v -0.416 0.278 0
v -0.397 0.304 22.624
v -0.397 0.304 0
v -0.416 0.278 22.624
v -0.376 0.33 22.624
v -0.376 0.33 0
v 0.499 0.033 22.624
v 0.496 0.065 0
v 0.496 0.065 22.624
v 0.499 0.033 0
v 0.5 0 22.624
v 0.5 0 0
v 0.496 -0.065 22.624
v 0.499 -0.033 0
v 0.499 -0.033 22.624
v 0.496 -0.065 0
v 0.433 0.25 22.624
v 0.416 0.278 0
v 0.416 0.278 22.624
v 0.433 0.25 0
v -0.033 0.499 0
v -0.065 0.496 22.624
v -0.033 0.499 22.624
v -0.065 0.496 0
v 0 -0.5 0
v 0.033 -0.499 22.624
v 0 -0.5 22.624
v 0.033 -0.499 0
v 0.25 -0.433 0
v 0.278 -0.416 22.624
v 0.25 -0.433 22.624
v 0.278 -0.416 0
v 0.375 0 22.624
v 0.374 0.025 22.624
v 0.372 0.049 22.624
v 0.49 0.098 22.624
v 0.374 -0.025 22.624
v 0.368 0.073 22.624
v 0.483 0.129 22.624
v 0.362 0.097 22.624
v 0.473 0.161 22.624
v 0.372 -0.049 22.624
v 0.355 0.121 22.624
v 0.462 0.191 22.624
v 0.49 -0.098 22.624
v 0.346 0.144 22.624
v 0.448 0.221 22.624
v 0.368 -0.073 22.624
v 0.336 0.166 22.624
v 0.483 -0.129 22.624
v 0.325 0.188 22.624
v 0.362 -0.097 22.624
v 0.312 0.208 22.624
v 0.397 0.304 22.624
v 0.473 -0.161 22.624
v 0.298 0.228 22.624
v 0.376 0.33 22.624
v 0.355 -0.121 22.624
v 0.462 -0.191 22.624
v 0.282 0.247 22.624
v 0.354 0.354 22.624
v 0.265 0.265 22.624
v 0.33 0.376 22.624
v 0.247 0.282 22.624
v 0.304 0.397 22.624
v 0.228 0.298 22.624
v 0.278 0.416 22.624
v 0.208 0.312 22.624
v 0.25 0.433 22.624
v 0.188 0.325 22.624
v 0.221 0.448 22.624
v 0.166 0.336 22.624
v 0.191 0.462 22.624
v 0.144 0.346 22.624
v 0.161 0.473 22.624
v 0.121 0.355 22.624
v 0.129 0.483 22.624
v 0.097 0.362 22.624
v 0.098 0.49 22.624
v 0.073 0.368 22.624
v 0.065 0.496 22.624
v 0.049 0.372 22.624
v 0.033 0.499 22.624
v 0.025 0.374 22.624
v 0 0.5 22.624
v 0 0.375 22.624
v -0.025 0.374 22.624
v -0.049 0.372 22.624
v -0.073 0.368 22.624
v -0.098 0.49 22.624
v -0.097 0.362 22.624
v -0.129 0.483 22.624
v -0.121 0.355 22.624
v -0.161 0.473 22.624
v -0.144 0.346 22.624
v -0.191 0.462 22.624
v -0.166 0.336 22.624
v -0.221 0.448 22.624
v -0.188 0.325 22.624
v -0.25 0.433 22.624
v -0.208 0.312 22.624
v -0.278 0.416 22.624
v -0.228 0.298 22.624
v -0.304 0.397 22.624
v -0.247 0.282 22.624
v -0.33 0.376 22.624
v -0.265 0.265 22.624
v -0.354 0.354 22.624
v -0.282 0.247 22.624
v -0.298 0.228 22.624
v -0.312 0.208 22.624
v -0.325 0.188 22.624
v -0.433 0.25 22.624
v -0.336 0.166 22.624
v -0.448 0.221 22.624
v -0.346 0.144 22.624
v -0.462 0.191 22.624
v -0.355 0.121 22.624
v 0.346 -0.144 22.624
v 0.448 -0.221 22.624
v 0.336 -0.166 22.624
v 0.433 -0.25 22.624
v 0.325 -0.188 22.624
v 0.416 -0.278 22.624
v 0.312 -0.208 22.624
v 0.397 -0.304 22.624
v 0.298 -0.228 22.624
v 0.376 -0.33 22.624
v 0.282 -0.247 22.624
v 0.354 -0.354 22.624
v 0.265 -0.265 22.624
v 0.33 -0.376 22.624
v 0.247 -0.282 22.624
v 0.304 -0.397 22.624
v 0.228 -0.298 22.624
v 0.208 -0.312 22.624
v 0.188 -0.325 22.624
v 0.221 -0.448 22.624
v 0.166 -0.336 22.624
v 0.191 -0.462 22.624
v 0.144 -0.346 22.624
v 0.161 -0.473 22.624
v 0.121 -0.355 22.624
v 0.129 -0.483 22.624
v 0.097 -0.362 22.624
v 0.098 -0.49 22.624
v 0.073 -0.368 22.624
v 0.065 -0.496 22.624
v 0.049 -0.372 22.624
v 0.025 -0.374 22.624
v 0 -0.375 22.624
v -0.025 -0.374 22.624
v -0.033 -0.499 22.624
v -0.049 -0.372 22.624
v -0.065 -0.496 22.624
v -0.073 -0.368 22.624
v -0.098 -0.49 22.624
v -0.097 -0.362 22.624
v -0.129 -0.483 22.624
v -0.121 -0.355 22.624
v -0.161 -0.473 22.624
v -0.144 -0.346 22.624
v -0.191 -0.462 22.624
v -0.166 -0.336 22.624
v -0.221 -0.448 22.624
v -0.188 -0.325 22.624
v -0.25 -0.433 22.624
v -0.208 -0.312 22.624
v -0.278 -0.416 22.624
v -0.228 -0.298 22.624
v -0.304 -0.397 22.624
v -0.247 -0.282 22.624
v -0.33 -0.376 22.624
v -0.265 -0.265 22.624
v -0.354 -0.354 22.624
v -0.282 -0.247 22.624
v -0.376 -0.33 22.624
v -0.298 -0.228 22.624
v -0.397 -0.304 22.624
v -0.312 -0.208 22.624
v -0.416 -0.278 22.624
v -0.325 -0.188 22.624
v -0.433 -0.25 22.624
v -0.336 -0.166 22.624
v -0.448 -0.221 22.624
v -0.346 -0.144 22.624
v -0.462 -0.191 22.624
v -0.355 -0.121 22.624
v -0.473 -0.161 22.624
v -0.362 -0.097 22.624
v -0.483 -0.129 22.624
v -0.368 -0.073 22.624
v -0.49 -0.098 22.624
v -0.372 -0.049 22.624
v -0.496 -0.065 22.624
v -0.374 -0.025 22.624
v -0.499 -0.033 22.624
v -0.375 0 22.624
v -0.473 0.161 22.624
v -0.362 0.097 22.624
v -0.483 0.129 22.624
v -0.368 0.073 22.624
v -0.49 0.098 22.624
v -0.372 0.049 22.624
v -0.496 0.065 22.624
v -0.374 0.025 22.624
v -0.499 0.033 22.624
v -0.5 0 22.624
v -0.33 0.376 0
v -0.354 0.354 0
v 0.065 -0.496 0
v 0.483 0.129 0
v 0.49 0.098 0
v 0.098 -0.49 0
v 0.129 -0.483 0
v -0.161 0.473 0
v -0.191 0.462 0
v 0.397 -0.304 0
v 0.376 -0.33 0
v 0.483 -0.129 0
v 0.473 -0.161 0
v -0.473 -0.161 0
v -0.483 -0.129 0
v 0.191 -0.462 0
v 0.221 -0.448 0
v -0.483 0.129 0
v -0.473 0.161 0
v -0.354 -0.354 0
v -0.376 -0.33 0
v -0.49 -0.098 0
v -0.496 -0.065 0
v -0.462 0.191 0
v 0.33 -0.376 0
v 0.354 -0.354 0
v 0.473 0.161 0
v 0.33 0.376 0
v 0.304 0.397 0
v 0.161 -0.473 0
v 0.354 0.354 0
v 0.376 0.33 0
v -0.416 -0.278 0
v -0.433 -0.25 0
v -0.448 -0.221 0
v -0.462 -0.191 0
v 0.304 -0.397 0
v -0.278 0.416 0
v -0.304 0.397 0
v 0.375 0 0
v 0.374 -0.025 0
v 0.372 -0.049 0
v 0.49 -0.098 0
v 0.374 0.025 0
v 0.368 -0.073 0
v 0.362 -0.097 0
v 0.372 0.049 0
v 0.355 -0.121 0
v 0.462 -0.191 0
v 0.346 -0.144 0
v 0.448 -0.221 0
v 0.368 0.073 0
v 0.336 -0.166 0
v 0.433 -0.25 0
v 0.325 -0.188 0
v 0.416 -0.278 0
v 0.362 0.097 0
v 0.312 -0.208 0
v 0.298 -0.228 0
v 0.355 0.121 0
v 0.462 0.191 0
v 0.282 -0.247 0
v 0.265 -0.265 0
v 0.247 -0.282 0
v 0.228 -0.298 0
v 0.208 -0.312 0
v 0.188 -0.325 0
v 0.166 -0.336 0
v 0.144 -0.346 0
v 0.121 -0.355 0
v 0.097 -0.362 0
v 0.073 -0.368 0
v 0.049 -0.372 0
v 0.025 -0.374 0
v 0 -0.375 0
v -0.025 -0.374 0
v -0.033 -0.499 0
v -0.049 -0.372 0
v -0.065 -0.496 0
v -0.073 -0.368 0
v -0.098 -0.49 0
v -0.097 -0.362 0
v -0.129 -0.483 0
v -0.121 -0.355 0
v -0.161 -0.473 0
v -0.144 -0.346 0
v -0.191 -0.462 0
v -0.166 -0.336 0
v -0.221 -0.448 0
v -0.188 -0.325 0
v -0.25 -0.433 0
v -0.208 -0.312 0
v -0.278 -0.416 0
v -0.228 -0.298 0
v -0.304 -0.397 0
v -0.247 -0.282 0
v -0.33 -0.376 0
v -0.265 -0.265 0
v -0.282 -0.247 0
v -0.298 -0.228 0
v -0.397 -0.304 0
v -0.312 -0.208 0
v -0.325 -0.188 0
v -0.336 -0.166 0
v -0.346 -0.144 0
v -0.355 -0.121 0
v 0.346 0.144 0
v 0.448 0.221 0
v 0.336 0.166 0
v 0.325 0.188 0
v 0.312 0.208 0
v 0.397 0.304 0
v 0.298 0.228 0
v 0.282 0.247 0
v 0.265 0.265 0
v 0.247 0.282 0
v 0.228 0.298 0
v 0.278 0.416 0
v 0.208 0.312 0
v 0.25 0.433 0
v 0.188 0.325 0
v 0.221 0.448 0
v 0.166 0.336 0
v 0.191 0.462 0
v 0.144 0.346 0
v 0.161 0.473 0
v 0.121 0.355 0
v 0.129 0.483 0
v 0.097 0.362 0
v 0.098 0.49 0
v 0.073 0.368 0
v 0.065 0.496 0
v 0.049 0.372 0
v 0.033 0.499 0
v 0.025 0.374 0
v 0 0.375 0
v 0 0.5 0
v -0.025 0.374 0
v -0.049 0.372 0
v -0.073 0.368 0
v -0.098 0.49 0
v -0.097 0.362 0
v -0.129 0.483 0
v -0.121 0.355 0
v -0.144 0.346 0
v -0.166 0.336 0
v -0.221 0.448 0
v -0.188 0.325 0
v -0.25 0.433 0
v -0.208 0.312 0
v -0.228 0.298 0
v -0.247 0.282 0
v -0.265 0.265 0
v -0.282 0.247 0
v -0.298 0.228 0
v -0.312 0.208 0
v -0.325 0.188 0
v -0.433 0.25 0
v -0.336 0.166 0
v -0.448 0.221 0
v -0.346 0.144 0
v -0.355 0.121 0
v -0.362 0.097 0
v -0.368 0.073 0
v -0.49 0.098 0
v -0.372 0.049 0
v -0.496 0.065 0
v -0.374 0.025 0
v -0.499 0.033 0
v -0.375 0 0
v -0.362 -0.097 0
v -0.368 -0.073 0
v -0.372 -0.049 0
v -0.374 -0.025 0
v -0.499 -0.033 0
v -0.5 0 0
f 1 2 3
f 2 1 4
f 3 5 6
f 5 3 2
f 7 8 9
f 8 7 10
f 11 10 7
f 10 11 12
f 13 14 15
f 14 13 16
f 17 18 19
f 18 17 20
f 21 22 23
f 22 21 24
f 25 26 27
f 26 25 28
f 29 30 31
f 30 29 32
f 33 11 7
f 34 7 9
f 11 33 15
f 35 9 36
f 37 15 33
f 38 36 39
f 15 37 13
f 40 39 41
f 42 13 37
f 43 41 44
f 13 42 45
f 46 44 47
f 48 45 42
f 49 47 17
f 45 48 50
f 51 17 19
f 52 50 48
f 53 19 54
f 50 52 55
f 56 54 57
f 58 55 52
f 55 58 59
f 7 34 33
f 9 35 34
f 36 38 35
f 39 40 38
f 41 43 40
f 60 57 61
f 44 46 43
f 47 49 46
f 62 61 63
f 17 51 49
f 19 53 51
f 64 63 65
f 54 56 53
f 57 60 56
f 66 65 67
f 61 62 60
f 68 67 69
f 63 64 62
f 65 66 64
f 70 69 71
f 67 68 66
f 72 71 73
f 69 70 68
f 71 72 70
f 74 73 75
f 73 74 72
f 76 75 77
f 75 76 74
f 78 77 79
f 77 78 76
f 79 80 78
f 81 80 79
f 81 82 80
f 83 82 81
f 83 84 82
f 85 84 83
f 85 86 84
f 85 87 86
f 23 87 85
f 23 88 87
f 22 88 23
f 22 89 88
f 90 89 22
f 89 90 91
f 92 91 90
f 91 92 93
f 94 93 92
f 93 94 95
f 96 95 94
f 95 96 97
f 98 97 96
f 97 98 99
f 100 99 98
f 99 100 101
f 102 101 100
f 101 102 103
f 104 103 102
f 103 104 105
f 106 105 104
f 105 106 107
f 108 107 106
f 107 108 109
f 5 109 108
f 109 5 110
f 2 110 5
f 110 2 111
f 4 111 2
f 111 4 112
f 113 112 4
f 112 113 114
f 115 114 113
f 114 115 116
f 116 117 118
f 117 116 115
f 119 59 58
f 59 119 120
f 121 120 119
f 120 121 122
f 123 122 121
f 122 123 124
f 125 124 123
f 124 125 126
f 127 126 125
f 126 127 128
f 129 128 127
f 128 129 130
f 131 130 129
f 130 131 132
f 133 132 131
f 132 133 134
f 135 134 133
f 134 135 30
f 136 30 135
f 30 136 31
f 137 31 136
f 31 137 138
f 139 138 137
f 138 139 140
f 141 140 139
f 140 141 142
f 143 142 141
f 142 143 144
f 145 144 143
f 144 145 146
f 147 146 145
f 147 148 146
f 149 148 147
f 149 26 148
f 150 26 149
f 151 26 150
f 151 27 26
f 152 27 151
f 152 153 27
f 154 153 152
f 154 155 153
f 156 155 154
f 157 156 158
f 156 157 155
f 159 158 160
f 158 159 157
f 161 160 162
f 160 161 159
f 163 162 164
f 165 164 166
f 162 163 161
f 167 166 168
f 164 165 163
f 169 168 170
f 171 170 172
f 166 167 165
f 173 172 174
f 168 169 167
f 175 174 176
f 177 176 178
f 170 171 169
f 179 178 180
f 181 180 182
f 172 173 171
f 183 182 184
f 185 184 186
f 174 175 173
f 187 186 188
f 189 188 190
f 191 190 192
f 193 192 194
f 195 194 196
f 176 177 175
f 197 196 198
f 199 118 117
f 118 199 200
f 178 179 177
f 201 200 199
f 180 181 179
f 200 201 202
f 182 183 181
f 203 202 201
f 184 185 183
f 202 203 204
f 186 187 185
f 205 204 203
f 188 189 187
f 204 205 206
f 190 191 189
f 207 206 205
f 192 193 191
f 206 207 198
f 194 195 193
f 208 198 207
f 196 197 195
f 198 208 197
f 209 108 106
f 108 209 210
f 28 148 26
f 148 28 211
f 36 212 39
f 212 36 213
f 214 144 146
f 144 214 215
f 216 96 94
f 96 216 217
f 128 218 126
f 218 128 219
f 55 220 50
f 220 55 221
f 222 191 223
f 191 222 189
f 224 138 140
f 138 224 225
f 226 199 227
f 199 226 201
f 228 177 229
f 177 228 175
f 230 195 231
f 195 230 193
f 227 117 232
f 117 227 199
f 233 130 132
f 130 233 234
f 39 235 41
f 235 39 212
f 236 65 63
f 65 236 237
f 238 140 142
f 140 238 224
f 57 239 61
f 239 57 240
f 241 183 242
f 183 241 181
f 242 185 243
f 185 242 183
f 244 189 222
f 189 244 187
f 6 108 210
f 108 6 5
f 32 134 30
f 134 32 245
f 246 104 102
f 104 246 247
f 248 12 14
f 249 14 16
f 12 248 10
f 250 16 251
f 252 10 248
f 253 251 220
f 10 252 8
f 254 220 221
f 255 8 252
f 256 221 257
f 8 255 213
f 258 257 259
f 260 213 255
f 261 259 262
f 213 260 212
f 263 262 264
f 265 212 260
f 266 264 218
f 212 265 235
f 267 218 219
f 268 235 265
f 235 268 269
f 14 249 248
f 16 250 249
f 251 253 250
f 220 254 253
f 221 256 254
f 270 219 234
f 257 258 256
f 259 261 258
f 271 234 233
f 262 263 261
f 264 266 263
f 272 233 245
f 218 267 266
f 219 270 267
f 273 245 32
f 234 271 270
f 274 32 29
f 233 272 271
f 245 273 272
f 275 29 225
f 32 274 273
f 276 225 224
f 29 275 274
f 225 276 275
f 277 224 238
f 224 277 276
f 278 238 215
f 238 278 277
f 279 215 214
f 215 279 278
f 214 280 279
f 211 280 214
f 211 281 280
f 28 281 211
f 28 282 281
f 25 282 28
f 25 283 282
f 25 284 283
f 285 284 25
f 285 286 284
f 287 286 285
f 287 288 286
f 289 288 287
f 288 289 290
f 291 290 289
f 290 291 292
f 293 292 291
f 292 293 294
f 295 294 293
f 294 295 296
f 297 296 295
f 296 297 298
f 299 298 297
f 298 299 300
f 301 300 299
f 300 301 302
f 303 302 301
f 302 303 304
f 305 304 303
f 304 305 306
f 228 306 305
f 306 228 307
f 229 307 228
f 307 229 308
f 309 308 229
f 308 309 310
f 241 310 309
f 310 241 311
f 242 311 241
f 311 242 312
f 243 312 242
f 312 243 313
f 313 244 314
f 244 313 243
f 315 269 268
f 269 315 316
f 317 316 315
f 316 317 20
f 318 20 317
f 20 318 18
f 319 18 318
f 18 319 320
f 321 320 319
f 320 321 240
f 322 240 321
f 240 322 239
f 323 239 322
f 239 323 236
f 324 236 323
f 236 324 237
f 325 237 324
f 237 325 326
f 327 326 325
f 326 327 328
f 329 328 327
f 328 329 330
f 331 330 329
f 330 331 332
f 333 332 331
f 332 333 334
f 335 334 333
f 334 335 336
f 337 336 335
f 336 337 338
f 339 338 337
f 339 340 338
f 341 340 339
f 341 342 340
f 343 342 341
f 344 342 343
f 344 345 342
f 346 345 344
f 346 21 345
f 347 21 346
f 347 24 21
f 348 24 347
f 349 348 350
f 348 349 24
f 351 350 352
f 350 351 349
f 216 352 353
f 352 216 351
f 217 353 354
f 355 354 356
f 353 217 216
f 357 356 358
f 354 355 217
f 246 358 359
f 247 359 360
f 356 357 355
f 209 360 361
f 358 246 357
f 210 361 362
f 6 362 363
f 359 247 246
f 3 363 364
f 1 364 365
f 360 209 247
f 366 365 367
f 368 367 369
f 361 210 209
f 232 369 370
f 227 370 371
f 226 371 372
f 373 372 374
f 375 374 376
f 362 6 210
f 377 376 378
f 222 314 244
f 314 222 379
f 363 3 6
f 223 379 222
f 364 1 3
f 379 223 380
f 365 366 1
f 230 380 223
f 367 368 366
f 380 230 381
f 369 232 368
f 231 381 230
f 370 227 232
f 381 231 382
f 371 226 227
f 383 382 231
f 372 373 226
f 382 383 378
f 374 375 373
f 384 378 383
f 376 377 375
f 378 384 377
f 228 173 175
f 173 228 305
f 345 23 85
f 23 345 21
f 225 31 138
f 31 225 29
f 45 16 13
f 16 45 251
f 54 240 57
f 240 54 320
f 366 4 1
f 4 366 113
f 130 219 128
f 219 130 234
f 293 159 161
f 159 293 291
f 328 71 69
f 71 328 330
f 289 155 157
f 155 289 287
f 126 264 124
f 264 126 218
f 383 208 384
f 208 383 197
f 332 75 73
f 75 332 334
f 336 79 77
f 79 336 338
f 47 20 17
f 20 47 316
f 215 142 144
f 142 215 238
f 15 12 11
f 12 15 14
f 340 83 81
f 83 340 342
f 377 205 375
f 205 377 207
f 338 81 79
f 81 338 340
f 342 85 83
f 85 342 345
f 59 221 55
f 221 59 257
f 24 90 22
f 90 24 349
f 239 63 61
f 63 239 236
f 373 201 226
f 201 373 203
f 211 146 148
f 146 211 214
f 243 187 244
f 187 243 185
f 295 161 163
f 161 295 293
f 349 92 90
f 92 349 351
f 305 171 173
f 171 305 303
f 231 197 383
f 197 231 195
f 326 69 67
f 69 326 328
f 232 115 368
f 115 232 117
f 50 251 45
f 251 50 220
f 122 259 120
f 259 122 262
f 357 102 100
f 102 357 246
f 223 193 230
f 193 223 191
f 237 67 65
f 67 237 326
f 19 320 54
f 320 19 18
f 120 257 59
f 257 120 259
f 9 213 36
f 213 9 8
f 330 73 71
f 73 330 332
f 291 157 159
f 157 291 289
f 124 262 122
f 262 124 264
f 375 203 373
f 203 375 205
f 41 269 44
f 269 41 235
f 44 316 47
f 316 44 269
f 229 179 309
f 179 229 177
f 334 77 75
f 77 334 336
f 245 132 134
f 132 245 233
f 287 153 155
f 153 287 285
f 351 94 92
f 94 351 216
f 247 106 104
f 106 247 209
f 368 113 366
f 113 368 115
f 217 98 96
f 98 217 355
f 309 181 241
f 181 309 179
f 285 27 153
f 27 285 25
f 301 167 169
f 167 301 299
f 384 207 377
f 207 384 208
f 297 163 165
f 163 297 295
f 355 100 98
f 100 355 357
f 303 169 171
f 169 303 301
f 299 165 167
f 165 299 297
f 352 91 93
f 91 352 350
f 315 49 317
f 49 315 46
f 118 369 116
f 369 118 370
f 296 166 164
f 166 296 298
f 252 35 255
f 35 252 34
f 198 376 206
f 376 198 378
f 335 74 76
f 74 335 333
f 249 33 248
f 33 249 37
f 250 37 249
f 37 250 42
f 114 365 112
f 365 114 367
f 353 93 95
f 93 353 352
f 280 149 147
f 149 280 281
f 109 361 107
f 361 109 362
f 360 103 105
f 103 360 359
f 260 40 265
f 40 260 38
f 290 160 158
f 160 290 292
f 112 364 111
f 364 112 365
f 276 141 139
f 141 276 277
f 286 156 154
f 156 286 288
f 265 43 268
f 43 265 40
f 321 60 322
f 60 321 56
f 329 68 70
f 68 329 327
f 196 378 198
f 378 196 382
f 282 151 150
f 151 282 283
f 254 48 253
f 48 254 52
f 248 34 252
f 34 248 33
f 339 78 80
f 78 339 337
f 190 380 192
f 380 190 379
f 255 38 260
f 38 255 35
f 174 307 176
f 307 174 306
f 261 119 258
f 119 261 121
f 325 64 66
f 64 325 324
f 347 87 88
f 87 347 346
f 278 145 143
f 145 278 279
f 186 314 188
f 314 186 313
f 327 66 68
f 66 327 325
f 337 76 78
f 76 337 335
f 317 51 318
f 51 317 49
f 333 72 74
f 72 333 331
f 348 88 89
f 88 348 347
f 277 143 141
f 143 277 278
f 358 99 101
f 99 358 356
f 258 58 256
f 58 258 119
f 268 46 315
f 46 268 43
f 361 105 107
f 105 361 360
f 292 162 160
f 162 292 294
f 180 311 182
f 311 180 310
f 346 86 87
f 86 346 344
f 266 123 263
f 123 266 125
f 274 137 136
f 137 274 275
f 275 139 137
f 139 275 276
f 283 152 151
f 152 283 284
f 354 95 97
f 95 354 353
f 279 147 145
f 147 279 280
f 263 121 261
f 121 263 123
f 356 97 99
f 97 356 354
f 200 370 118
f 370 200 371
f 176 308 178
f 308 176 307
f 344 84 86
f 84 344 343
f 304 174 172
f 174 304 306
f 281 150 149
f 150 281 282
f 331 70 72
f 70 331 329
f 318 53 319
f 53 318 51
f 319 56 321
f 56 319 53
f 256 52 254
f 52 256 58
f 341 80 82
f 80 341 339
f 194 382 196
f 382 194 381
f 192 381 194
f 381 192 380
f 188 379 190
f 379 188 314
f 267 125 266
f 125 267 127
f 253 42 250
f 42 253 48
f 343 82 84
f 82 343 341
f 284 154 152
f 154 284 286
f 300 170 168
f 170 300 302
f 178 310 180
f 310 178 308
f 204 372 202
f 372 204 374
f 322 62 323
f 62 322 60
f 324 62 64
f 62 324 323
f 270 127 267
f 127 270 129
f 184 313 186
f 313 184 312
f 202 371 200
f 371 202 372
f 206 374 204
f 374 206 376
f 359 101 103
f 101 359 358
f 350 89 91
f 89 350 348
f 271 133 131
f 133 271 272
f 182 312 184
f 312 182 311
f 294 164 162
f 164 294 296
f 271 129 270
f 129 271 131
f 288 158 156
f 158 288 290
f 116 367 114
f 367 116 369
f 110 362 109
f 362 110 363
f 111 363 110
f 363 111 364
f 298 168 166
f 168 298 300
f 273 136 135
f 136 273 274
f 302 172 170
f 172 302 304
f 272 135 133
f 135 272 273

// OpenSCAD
// =============================================================
// Irish Flute — Parametric OpenSCAD Master
// =============================================================
// Source of truth: design.md (Governing Model + Tone-Hole First Pass table),
// family-spec.csv (IFL-D4 row), cut-list.csv (stock/OD).
//
// Authority status: pending_measurement — NOT fabrication authority until
// reviewed against a measured D4 prototype (validation.csv V-FUND and
// per-hole cents-error rows). See cad/mcp-session-log.md for provenance.
//
// SCOPE BOUNDARY (tuning-sensitive geometry intentionally out of scope):
//   - Embouchure window/bevel geometry is NOT modeled here. design.md A2
//     notes the embouchure correction is only an ordinary open-end
//     approximation; real embouchure cutting must be hand-refined and
//     play-tested (cad/README.md "Model Order" step 2).
//   - Tone-hole undercutting/voicing is NOT modeled; holes are drawn at
//     the design.md starter diameters only, "drill undersize and tune
//     up incrementally" (design.md A3).
//   - This is an open-open cylindrical-bore envelope + tone-hole position
//     schedule only, per the instrument-maker starter-generator boundary.
// =============================================================

$fn = 96;

// --------- INPUT PARAMETERS (edit only against design.md / family-spec.csv) ---

// Governing acoustic model (design.md "Governing Model"): open-open
// cylindrical pipe.  f = c / (2*L_eff);  L_eff = c / (2*f);
// L_bore = L_eff - 2*(0.6*r)   [two open-end corrections]
c_in_per_sec      = 13552;   // speed of sound @ 68F/20C (design.md)
f_root_hz         = 293.66;  // D4 target (design.md, family-spec.csv IFL-D4)

bore_id_in        = 0.750;   // D4 prototype bore ID (design.md; family-spec.csv bore_id_mm=19.0)
bore_r_in         = bore_id_in / 2;

body_od_in        = 1.000;   // finished OD (cut-list.csv item 1 final_od_in)
wall_in           = (body_od_in - bore_id_in) / 2;  // = 0.125 in (design.md A4)

L_eff_in          = c_in_per_sec / (2 * f_root_hz);           // acoustic length
end_corr_total_in = 2 * (0.6 * bore_r_in);                    // two open ends
L_bore_in         = L_eff_in - end_corr_total_in;             // first-order physical bore

// Tone-hole schedule — design.md "Tone-Hole First Pass" table.
// [note, freq_hz, distance_from_foot_in, starter_diameter_in]
// distance_from_foot = L_eff * (1 - f_root/f_hole); tabulated in design.md,
// reproduced here as data (not re-derived) so this file matches the
// reviewed design.md table exactly. Diameters are conservative starters —
// "drill undersize and tune up incrementally" (design.md A3).
tone_holes = [
    ["E4",  329.63,  2.58, 0.250],
    ["F#4", 369.99,  4.76, 0.281],
    ["G4",  392.00,  5.77, 0.281],
    ["A4",  440.00,  7.68, 0.313],
    ["B4",  493.88,  9.38, 0.313],
    ["C#5", 554.37, 10.89, 0.313],
];

hole_drill_len_in = wall_in * 4;  // clean through-cut allowance for the diff() cutter

// --------- MODULES ---------------------------------------------------------

// Cylindrical body: OD wall around the bore, length = L_bore_in (first-order;
// design.md notes a further 1.87 in trim/setup allowance before final cut —
// not modeled here, this is the target bore length only).
module flute_body() {
    difference() {
        cylinder(h = L_bore_in, d = body_od_in);
        translate([0, 0, -0.01])
            cylinder(h = L_bore_in + 0.02, d = bore_id_in);
    }
}

// One tone hole, drilled radially at the documented distance from the foot
// (z=0) end, on the +X side of the body.
module tone_hole(distance_from_foot_in, diameter_in) {
    translate([0, 0, distance_from_foot_in])
        rotate([0, 90, 0])
            cylinder(h = hole_drill_len_in, d = diameter_in, center = true);
}

// Top-level assembly: body with all six tone holes cut.
module irish_flute_d4() {
    difference() {
        flute_body();
        for (h = tone_holes) {
            tone_hole(h[2], h[3]);
        }
    }
}

irish_flute_d4();

echo(str("L_eff (acoustic length) = ", L_eff_in, " in"));
echo(str("L_bore (first-order physical bore) = ", L_bore_in, " in"));
echo(str("bore_id = ", bore_id_in, " in;  body_od = ", body_od_in, " in;  wall = ", wall_in, " in"));
echo(str("tone holes modeled: ", len(tone_holes)));
